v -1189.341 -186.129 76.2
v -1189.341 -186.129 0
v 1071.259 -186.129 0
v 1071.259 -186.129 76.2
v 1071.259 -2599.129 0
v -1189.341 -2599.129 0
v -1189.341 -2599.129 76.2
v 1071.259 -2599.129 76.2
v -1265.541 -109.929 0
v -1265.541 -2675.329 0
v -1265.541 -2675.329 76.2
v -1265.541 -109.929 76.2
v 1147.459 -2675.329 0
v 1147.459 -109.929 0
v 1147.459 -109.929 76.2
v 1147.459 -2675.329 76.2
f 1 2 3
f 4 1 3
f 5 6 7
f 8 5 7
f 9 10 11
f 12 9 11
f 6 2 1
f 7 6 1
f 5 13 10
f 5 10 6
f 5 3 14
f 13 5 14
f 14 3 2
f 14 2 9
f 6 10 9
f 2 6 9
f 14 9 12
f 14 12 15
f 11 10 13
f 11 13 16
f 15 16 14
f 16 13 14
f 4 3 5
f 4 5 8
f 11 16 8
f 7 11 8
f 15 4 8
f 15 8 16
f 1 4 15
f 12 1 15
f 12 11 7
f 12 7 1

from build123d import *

# Parameters (mm, degrees)
F0_W     = 2413
F0_H     = 76.2
F1_DEPTH = 76.2
F2_W     = 76.2
F2_H     = 76.2
F3_DEPTH = 2489.2
F4_W     = 76.2
F4_H     = 76.2
F6_DEPTH = 2336.8


with BuildPart() as f1:
    # F0 (on Top) → F1 (new body)
    with BuildSketch(Plane.XY):
        with Locations((-59.041053, -148.028982)):
            Rectangle(F0_W, F0_H)
    extrude(amount=F1_DEPTH)

    # F2 (on face) → F3 (join)
    with BuildSketch(Plane.XZ.offset(186.128982)):
        with Locations((-1227.441053, 38.1)):
            Rectangle(F2_W, F2_H)
        with Locations((1109.358947, 38.1)):
            Rectangle(F2_W, F2_H)
    extrude(amount=F3_DEPTH)

    # F4 (on face) → F6 (join)
    with BuildSketch(Plane.YZ.offset(-1189.341053)):
        with Locations((-2637.228982, 38.1)):
            Rectangle(F4_W, F4_H)
    extrude(amount=F6_DEPTH)


solid = f1.part
